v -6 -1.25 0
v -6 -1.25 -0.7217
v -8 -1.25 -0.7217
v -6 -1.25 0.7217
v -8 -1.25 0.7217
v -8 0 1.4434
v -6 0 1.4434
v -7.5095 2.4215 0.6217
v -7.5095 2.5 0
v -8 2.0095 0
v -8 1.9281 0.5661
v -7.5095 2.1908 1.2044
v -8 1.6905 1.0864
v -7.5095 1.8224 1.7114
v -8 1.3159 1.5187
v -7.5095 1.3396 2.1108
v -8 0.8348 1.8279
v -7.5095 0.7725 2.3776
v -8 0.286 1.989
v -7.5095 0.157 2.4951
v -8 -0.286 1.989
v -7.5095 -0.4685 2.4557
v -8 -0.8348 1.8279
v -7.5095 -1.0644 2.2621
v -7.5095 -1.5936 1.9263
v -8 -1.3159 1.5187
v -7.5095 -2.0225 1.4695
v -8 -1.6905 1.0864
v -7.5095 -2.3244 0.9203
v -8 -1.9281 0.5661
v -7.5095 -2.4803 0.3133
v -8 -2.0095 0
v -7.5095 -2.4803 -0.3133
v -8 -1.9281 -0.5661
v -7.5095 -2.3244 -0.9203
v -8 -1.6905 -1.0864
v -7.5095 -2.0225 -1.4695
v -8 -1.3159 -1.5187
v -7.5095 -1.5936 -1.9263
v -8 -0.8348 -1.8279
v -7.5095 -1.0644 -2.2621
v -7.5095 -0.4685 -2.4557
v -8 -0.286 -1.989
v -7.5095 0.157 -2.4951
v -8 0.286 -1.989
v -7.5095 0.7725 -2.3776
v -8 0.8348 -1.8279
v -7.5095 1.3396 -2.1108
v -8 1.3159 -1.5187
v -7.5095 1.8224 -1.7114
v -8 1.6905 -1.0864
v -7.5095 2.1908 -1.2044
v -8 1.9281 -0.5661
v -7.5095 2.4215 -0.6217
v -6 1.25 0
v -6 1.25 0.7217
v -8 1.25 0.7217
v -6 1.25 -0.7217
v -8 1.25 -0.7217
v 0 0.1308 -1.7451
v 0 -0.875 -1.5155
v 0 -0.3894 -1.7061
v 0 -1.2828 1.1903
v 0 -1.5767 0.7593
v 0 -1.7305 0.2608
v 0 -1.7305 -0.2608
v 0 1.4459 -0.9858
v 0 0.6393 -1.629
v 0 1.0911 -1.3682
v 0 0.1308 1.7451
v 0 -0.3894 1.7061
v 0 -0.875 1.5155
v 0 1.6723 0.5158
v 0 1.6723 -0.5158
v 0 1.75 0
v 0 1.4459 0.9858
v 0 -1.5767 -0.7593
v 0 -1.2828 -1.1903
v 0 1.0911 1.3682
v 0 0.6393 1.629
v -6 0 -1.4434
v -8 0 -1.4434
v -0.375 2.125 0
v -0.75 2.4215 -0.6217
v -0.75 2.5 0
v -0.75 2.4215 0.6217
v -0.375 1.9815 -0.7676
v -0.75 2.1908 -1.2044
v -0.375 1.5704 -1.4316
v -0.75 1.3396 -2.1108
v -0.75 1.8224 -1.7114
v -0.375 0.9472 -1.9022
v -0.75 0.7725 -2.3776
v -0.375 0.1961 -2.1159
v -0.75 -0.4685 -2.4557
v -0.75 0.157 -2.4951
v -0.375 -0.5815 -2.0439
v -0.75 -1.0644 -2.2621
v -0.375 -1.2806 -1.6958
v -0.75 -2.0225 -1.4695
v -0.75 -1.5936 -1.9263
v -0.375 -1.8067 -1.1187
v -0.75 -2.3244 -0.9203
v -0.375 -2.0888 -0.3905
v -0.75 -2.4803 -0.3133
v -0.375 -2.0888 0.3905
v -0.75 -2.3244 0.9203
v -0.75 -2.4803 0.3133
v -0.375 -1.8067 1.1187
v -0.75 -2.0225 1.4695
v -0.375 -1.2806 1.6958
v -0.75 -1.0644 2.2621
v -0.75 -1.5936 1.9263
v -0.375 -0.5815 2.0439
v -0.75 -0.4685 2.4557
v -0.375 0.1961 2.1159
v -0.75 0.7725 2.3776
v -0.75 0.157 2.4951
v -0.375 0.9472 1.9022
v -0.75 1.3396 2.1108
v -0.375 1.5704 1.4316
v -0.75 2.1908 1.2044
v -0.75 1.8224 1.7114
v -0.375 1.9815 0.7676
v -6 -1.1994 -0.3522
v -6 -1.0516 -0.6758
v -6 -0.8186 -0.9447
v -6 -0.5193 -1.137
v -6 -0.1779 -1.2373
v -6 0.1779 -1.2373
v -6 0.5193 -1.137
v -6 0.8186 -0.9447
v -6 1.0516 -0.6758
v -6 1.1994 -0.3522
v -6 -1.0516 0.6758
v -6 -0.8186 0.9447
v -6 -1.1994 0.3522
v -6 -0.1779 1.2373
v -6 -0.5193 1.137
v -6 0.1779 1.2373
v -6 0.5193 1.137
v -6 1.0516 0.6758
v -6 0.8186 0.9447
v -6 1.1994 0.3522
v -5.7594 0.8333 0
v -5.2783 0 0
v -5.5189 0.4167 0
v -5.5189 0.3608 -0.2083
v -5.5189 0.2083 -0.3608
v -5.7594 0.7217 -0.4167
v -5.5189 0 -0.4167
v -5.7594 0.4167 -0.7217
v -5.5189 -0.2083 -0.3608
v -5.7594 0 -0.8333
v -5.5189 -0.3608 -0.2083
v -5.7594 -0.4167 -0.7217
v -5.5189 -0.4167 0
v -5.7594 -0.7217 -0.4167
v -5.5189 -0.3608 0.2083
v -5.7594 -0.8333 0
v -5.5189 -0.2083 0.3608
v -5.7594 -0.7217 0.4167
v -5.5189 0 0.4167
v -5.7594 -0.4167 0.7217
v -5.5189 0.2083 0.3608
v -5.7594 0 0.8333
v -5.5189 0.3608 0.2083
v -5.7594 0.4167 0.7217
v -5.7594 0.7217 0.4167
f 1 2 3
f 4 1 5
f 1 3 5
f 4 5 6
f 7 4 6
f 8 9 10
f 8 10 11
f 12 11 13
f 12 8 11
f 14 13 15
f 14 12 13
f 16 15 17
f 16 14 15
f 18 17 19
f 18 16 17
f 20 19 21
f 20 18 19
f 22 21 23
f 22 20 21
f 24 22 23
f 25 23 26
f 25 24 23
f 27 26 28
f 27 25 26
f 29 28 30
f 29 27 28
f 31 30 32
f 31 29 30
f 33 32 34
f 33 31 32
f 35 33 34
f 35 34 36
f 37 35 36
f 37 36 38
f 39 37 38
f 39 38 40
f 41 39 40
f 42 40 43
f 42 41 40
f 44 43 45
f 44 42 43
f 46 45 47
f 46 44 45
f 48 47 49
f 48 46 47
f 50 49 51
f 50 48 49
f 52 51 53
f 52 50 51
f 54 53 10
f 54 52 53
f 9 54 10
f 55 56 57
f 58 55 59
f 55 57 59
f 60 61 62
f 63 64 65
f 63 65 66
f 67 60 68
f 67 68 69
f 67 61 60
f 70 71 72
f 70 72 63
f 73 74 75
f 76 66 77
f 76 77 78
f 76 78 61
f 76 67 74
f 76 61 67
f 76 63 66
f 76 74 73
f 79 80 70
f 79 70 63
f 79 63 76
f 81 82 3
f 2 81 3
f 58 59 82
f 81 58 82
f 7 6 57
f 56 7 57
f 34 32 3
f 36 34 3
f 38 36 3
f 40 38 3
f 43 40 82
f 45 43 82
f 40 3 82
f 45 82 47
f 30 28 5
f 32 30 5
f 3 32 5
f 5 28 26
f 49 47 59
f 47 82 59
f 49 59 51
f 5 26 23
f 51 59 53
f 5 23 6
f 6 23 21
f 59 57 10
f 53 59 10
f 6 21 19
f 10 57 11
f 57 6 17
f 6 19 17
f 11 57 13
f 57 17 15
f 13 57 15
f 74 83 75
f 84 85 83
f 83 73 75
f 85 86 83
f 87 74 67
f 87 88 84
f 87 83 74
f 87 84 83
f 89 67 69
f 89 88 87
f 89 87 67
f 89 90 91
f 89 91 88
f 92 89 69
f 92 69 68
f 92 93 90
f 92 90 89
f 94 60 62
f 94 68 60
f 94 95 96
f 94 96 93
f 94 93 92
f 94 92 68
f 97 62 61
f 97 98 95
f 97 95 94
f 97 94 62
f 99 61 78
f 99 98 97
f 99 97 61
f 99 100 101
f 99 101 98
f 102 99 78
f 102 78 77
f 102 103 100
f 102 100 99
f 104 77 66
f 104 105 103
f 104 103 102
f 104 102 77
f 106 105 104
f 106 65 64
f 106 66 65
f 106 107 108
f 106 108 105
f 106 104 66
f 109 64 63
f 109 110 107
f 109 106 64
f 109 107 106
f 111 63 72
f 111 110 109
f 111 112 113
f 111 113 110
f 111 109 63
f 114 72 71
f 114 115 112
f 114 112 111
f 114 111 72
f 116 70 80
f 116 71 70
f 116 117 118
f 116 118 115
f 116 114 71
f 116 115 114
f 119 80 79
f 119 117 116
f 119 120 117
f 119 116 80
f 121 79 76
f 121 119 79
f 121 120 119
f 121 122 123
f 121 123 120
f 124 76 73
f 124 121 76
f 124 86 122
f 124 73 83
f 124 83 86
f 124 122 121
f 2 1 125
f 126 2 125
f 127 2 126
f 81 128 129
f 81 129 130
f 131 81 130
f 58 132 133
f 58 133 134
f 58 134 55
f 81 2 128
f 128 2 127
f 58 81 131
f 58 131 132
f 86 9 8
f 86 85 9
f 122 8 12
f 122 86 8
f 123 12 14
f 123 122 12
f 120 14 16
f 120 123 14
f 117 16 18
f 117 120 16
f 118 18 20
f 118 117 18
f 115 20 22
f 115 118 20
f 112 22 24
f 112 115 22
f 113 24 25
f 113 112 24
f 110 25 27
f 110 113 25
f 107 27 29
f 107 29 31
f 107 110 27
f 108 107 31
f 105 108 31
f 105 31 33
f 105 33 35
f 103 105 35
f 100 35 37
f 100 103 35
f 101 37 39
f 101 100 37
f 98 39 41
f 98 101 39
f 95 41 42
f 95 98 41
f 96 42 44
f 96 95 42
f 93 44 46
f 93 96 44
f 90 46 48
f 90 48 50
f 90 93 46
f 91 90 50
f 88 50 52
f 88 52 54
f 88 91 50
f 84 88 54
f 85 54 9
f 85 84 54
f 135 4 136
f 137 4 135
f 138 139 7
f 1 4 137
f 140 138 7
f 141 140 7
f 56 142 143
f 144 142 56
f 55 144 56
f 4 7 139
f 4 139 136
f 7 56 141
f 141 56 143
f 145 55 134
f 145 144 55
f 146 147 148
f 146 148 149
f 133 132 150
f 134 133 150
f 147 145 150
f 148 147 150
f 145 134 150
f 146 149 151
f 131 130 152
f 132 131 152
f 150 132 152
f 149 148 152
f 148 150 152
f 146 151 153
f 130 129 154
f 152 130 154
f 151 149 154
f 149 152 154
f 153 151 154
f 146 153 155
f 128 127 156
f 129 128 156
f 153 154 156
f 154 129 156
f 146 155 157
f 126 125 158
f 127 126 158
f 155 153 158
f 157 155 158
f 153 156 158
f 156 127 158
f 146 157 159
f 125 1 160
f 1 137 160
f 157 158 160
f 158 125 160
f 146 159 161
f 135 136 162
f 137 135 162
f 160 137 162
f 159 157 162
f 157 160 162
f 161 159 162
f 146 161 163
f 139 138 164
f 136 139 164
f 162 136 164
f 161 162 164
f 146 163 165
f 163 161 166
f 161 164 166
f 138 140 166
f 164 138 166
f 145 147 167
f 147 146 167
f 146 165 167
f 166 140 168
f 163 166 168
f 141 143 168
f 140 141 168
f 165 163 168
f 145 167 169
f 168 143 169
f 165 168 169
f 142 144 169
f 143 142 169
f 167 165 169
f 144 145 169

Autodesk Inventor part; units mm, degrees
sketch "Sketch_1" plane through (0, 0, 0) normal (0, 0, 1) x (1, 0, 0)
  line L0 (0, 0) -> (-8, 0)
  line L1 (-8, 0) -> (-8, 2.0095)
  line L2 (-8, 2.0095) -> (-7.5095, 2.5)
  line L3 (-7.5095, 2.5) -> (-0.75, 2.5)
  line L4 (-0.75, 2.5) -> (0, 1.75)
  line L5 (0, 1.75) -> (0, 0)
  line L6 (0, 0) -> (-8, 0)
revolve "Revolution1" add sketch "Sketch_1" angle 360 about axis through (0, 0, 0) along (1, 0, 0)
thread "Thread1" size "M5x0.8" class "6g" standard "ISO Metric profile" full length
sketch "Sketch_2" plane through (-8, 0, 0) normal (-1, 0, 0) x (0, 1, 0)
  line L0 (-1.25, 0.7217) -> (-1.25, -0.7217)
  line L1 (-1.25, -0.7217) -> (0, -1.4434)
  line L2 (0, -1.4434) -> (1.25, -0.7217)
  line L3 (1.25, -0.7217) -> (1.25, 0.7217)
  line L4 (1.25, 0.7217) -> (0, 1.4434)
  line L5 (0, 1.4434) -> (-1.25, 0.7217)
extrude "Extrusion1" cut sketch "Sketch_2" against normal blind 2
sketch "Sketch_3" plane through (0, 0, 0) normal (0, 0, 1) x (1, 0, 0)
  line L0 (-5.2783, 0) -> (-6, 0)
  line L1 (-6, 0) -> (-6, 1.25)
  line L2 (-6, 1.25) -> (-5.2783, 0)
  line L3 (-5.2783, 0) -> (-6, 0)
revolve "Revolution2" cut sketch "Sketch_3" angle 360 about axis through (-5.2783, 0, 0) along (1, 0, 0)
ref_plane "CP_XY" through (0, 0, 0) normal (1, 0, 0) x (0, 0, -1)
ref_plane "CP_YZ" through (0, 0, 0) normal (0, 0, -1) x (0, 1, 0)
ref_plane "CP_ZX" through (0, 0, 0) normal (0, 1, 0) x (1, 0, 0)
properties part number "SET-SCREW5-8"
